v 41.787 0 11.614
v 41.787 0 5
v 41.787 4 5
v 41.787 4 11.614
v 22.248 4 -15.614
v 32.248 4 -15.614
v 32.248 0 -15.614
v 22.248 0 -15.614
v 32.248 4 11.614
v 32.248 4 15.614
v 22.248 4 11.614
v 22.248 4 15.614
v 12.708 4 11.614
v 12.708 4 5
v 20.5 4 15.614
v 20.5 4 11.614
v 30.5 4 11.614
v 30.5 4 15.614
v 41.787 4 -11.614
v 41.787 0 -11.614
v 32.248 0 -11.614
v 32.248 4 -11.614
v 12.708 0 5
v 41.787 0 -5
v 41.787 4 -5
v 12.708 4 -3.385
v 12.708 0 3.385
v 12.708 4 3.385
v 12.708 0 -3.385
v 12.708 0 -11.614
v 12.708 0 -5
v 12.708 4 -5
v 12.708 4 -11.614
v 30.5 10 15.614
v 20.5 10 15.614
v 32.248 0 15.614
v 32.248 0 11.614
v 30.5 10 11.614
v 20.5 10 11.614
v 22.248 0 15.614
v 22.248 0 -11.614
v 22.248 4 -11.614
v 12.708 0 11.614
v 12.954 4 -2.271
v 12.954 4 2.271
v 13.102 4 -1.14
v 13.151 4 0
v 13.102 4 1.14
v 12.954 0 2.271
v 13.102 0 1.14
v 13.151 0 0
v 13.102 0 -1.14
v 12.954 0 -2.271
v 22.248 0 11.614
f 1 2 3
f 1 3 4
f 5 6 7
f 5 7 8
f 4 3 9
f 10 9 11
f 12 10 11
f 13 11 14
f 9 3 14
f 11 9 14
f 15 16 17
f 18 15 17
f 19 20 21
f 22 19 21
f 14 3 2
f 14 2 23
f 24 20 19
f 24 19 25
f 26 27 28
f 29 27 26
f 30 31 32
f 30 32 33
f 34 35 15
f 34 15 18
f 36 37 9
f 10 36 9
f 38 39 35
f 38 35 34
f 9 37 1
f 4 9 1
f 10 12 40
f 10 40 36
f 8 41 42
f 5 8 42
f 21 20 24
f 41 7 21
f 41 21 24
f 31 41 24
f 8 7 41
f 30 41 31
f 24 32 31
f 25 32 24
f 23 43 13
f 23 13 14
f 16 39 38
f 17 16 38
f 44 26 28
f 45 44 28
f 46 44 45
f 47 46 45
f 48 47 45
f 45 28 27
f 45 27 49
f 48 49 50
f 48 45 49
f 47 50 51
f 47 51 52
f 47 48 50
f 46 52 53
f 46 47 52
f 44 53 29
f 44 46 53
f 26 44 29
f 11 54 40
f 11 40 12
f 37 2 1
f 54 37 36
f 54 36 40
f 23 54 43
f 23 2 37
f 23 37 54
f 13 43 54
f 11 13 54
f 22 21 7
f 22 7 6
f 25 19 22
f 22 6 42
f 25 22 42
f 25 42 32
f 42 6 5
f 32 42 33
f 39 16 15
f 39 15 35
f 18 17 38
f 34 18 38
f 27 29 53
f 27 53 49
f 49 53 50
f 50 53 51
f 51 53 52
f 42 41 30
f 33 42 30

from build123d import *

# Parameters (mm, degrees)
SKETCH1_R           = 2.5
BOSS_EXTRUDE2_DEPTH = 4
SKETCH12_W          = 10
SKETCH12_H          = 4
BOSS_EXTRUDE4_DEPTH = 4
SKETCH14_W          = 10
SKETCH14_H          = 4
BOSS_EXTRUDE5_DEPTH = 4
CUT_EXTRUDE1_DEPTH  = 6
SKETCH11_W          = 10
SKETCH11_H          = 6
BOSS_EXTRUDE3_DEPTH = 4


with BuildPart() as part:
    # Sketch1 → Boss-Extrude2 (new body)
    with BuildSketch(Plane(origin=(0, 0, 0), x_dir=(1, 0, 0), z_dir=(0, 1, 0))):
        Polygon((36.786877756, 11.613831083), (41.786877756, 11.613831083), (41.786877756, -11.613831083), (36.786877756, -11.613831083), (27.518556454, -11.613831083), (12.70818574, -11.613831083), (12.70818574, 11.613831083), (27.518556454, 11.613831083), align=None)
        with Locations(Location((16.5, 0, 0), (0, 0, 270))):
            Circle(SKETCH1_R, mode=Mode.SUBTRACT)
        with Locations(Location((22.5, 0, 0), (0, 0, 270))):
            Circle(SKETCH1_R, mode=Mode.SUBTRACT)
        with Locations(Location((28.5, 0, 0), (0, 0, 270))):
            Circle(SKETCH1_R, mode=Mode.SUBTRACT)
        with Locations(Location((34.5, 0, 0), (0, 0, 270))):
            Circle(SKETCH1_R, mode=Mode.SUBTRACT)
    extrude(amount=BOSS_EXTRUDE2_DEPTH)

    # Sketch12 → Boss-Extrude4 (add)
    with BuildSketch(Plane(origin=(0, 0, -11.613831083), x_dir=(-1, 0, 0), z_dir=(0, 0, -1))):
        with Locations((-27.247531748, 2)):
            Rectangle(SKETCH12_W, SKETCH12_H)
    extrude(amount=BOSS_EXTRUDE4_DEPTH)

    # Sketch14 → Boss-Extrude5 (add)
    with BuildSketch(Plane.XY.offset(11.613831083)):
        with Locations((27.247531748, 2)):
            Rectangle(SKETCH14_W, SKETCH14_H)
    extrude(amount=BOSS_EXTRUDE5_DEPTH)

    # Sketch10 → Cut-Extrude1 (cut)
    with BuildSketch(Plane(origin=(0, 4, 0), x_dir=(1, 0, 0), z_dir=(0, 1, 0))):
        with BuildLine():
            Line((41.812282814, 5), (41.812282814, -5))
            Line((41.812282814, -5), (12.163639885, -5))
            ThreePointArc((12.163639885, -5), (13.151202806, 0), (12.163639885, 5))
            Line((12.163639885, 5), (41.812282814, 5))
        make_face()
    extrude(amount=-CUT_EXTRUDE1_DEPTH, mode=Mode.SUBTRACT)


with BuildPart() as cut_extrude1_piece_1:
    # of the separate pieces the step leaves, piece 1, a body of its own (cut_extrude1_pieces)
    add(part.part.solids().sort_by_distance((41.786877756, 0, -11.613831083))[0])


with BuildPart() as cut_extrude1_piece_2:
    # of the separate pieces the step leaves, piece 2, a body of its own (cut_extrude1_pieces)
    add(part.part.solids().sort_by_distance((41.786877756, 0, 5))[0])


with BuildPart() as cut_extrude1_piece_3:
    # of the separate pieces the step leaves, piece 3, a body of its own (cut_extrude1_pieces)
    add(part.part.solids().sort_by_distance((12.70818574, 4, 3.384693553))[0])


with BuildPart() as body_4:
    # Sketch11 → Boss-Extrude3 (new body)
    with BuildSketch(Plane.XY.offset(11.613831083)):
        with Locations((25.5, 7)):
            Rectangle(SKETCH11_W, SKETCH11_H)
    extrude(amount=BOSS_EXTRUDE3_DEPTH)


solid = Compound([cut_extrude1_piece_1.part, cut_extrude1_piece_2.part, cut_extrude1_piece_3.part, body_4.part])
